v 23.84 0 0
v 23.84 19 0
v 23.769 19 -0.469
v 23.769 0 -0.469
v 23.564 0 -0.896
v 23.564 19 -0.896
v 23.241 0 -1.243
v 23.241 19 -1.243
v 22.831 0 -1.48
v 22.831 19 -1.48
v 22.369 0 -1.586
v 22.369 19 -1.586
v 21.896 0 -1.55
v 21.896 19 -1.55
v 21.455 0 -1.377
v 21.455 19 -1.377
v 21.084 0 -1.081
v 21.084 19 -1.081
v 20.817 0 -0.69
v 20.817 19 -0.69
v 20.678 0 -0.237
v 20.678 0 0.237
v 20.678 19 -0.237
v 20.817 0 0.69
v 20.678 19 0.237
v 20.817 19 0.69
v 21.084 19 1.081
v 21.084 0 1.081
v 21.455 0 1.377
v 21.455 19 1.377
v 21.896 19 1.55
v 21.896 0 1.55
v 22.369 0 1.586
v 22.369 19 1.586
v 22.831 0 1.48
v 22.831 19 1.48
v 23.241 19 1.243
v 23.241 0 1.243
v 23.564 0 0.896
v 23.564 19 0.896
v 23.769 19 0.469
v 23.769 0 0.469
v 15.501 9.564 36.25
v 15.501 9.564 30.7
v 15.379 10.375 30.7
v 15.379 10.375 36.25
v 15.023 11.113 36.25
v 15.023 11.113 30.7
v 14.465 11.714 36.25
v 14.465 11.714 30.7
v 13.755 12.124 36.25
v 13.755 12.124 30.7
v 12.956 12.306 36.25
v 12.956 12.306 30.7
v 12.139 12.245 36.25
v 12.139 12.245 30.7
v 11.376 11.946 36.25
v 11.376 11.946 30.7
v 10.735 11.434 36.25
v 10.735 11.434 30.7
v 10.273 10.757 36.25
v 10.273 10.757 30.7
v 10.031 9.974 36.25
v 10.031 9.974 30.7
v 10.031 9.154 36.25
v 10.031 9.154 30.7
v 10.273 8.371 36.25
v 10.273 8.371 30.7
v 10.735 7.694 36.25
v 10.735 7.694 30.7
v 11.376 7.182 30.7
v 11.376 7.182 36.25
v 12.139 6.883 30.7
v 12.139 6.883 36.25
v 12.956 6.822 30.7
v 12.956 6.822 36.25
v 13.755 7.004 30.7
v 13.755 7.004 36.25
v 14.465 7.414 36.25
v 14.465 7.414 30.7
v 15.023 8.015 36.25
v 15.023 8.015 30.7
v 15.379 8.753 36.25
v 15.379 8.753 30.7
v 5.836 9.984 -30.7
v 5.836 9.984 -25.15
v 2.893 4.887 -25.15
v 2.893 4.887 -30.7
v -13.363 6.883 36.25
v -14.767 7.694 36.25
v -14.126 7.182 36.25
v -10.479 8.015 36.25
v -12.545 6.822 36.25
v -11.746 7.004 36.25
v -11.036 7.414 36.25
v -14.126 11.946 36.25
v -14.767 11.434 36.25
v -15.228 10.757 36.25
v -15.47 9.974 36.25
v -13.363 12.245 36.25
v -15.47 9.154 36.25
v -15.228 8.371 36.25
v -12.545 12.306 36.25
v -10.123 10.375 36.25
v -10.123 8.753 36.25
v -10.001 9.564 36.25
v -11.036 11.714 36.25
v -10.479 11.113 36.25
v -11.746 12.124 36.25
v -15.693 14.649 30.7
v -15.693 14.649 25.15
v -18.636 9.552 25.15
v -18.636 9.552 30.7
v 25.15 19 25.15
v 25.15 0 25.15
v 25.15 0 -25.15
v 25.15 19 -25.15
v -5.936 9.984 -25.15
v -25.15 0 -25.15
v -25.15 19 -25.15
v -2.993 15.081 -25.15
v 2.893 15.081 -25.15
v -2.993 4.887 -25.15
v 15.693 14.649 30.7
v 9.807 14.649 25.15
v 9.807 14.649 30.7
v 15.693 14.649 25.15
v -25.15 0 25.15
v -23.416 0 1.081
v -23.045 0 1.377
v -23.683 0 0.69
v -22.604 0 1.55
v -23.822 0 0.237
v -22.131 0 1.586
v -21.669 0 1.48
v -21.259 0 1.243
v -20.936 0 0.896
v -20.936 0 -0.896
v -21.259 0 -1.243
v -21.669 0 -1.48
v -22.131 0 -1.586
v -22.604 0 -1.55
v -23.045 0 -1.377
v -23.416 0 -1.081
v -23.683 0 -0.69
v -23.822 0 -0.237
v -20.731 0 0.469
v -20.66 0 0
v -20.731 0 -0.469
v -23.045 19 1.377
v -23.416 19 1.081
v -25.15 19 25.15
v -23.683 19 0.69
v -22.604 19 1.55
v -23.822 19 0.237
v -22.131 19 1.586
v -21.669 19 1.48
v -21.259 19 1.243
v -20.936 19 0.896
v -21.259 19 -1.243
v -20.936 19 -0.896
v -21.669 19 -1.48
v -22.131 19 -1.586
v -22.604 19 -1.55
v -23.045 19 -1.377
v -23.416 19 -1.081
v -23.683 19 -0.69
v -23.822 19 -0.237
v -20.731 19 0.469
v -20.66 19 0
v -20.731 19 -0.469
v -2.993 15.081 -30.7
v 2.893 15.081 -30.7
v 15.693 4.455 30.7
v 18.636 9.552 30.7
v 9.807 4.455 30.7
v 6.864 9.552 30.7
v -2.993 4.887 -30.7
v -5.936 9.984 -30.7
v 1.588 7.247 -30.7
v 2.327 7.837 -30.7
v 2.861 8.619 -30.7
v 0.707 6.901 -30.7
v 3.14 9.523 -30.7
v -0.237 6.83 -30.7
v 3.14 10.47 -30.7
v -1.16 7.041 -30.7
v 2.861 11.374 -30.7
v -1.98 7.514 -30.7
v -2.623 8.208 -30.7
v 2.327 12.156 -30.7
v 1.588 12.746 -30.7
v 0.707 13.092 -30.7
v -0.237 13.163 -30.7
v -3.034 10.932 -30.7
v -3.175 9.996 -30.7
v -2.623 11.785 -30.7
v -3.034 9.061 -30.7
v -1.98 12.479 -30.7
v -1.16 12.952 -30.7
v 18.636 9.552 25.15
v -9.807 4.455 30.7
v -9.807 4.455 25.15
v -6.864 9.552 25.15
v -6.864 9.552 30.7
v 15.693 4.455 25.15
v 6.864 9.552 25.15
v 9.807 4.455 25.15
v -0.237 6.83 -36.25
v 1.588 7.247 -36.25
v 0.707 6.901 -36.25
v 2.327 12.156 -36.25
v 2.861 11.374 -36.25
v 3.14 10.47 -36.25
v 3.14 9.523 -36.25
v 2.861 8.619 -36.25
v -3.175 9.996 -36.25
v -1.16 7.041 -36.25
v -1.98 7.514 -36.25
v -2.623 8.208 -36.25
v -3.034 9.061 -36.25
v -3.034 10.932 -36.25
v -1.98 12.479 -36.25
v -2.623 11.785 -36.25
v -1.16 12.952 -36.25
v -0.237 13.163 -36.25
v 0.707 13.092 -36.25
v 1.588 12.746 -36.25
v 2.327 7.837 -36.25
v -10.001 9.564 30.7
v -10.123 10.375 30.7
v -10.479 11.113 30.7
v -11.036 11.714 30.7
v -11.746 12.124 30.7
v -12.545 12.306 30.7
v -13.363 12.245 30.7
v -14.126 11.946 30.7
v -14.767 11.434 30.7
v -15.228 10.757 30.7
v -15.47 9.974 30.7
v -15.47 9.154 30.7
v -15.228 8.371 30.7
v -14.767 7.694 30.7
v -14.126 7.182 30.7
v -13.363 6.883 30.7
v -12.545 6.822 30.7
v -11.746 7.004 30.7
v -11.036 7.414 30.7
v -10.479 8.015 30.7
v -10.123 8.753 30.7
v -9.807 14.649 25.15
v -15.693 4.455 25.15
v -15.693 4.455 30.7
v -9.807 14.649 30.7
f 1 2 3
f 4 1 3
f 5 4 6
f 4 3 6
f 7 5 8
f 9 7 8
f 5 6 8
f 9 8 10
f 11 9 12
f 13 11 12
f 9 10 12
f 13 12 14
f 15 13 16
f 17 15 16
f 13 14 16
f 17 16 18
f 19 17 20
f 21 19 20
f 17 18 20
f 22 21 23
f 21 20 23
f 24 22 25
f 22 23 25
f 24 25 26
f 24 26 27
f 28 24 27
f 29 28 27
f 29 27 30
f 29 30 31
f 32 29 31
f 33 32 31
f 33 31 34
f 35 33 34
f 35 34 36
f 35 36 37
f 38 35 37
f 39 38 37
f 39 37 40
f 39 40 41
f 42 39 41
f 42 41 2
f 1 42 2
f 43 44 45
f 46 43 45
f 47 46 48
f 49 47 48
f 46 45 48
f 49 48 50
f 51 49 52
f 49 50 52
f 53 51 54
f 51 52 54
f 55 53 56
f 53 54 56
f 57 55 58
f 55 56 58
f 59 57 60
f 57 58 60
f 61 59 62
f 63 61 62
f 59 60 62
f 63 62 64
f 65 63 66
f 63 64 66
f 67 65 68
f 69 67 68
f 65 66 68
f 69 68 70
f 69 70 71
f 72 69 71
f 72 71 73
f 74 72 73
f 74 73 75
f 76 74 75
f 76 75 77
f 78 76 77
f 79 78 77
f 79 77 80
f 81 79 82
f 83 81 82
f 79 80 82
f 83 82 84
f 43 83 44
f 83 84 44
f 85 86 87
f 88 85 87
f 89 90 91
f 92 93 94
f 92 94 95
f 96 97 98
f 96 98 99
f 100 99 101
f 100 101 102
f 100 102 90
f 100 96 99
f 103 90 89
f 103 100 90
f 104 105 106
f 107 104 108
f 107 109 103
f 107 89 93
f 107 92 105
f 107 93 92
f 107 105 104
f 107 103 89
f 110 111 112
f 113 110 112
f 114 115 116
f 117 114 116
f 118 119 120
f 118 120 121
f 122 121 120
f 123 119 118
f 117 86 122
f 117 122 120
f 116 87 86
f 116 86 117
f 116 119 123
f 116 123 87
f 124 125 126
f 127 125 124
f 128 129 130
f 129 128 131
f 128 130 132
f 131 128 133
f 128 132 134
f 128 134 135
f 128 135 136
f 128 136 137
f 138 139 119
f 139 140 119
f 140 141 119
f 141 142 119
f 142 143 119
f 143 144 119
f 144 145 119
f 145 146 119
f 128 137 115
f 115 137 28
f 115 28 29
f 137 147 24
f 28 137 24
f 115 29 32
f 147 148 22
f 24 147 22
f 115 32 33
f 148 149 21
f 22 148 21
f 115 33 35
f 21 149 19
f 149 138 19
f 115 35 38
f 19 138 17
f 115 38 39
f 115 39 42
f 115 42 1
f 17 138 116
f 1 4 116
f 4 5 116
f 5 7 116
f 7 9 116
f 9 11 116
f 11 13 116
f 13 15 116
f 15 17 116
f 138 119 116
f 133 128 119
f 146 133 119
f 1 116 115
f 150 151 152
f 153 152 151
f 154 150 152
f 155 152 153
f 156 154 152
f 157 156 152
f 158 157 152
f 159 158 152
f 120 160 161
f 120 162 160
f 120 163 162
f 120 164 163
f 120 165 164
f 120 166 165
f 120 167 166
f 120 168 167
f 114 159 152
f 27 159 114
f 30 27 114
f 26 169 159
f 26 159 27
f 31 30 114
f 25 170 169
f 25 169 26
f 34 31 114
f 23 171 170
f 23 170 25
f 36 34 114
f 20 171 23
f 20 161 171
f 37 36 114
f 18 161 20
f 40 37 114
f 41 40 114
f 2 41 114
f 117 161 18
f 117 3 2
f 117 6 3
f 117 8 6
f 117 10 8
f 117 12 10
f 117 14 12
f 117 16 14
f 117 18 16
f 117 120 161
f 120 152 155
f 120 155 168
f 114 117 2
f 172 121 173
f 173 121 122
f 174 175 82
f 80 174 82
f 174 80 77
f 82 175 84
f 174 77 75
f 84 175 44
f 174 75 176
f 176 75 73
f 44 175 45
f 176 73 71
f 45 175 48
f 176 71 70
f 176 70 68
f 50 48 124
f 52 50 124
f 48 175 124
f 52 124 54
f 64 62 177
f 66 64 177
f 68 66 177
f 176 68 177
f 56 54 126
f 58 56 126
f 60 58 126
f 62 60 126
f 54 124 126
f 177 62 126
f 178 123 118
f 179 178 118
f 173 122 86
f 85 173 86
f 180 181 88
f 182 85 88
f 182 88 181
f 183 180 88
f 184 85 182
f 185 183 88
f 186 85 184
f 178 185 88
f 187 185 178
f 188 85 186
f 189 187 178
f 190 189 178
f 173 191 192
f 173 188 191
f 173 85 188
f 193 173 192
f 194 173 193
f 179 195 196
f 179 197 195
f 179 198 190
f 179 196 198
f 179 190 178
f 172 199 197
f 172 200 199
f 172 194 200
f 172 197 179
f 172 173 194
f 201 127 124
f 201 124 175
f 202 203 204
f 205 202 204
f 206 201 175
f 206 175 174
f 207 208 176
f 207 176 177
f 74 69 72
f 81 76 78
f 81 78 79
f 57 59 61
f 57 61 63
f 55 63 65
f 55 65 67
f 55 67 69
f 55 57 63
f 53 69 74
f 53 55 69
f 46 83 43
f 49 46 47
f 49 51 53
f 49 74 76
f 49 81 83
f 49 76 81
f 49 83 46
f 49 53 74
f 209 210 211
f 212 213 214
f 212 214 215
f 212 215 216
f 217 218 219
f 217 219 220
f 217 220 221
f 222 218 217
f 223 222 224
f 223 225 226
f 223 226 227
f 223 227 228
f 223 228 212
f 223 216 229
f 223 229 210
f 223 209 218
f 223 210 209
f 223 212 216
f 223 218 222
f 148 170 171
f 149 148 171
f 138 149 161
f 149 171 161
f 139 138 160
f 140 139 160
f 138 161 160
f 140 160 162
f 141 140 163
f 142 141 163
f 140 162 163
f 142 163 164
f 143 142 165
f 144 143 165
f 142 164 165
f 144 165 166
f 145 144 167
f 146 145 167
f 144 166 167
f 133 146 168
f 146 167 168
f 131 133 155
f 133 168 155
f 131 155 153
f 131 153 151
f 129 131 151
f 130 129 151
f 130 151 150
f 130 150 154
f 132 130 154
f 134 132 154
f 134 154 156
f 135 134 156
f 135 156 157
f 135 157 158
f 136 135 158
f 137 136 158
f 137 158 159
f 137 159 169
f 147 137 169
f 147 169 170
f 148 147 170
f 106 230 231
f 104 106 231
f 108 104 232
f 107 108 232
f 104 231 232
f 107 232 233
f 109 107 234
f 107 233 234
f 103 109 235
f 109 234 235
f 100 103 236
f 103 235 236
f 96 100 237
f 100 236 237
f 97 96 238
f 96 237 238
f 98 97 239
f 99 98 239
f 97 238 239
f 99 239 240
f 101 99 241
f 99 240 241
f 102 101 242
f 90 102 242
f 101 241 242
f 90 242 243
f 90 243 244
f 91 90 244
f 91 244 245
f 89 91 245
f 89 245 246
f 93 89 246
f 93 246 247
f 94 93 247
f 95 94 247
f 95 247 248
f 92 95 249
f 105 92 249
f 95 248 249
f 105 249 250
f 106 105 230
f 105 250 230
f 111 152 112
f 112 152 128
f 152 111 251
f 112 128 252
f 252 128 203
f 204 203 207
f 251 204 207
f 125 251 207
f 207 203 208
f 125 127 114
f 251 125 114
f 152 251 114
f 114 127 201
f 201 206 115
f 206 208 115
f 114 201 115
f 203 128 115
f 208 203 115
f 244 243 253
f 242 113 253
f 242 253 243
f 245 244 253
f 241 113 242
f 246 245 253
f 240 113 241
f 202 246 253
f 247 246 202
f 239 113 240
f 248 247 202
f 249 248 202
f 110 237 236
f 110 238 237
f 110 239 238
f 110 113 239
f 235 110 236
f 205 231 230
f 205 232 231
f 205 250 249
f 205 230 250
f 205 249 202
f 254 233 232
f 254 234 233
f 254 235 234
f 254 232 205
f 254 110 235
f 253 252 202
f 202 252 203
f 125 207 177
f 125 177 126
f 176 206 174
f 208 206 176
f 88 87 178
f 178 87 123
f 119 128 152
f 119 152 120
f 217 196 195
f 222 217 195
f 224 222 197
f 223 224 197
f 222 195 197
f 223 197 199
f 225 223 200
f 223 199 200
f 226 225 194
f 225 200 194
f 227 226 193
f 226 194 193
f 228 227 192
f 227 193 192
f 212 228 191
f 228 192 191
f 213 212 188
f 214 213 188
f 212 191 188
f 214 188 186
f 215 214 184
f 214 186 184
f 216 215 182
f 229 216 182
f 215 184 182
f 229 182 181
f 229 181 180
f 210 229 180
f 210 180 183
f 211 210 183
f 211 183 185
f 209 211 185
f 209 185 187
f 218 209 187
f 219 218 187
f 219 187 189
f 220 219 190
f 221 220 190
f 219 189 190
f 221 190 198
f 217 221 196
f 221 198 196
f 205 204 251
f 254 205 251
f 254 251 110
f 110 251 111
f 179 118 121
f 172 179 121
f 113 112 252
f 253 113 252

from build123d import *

# Parameters (mm, degrees)
SKETCH1_W           = 50.3
SKETCH1_H           = 50.3
BOSS_EXTRUDE1_DEPTH = 19
BOSS_EXTRUDE2_DEPTH = 5.55
BOSS_EXTRUDE3_DEPTH = 5.55
SKETCH5_R           = 3.175
BOSS_EXTRUDE4_DEPTH = 5.55
SKETCH7_R           = 2.75
BOSS_EXTRUDE5_DEPTH = 5.55
SKETCH8_R           = 1.59
CUT_EXTRUDE1_DEPTH  = 20


with BuildPart() as part:
    # Sketch1 → Boss-Extrude1 (new body)
    with BuildSketch(Plane(origin=(0, 0, 0), x_dir=(1, 0, 0), z_dir=(0, 1, 0))):
        Rectangle(SKETCH1_W, SKETCH1_H)
    extrude(amount=BOSS_EXTRUDE1_DEPTH)

    # Sketch2 → Boss-Extrude2 (add)
    with BuildSketch(Plane.XY.offset(25.15)):
        Polygon((-15.692878403, 14.649004006), (-18.635756806, 9.551789092), (-15.692878403, 4.454574178), (-9.807121597, 4.454574178), (-6.864243194, 9.551789092), (-9.807121597, 14.649004006), align=None)
        Polygon((18.635756806, 9.551789092), (15.692878403, 4.454574178), (9.807121597, 4.454574178), (6.864243194, 9.551789092), (9.807121597, 14.649004006), (15.692878403, 14.649004006), align=None)
    extrude(amount=BOSS_EXTRUDE2_DEPTH)

    # Sketch4 → Boss-Extrude3 (add)
    with BuildSketch(Plane(origin=(0, 0, -25.15), x_dir=(-1, 0, 0), z_dir=(0, 0, -1))):
        Polygon((-5.835508644, 9.984378867), (-2.892754322, 4.887378867), (2.992754322, 4.887378867), (5.935508644, 9.984378867), (2.992754322, 15.081378867), (-2.892754322, 15.081378867), align=None)
    extrude(amount=BOSS_EXTRUDE3_DEPTH)

    # Sketch5 → Boss-Extrude4 (add)
    with BuildSketch(Plane(origin=(0, 0, -30.7), x_dir=(-1, 0, 0), z_dir=(0, 0, -1))):
        with Locations((0, 9.996378867)):
            Circle(SKETCH5_R)
    extrude(amount=BOSS_EXTRUDE4_DEPTH)

    # Sketch7 → Boss-Extrude5 (add)
    with BuildSketch(Plane.XY.offset(30.7)):
        with Locations((-12.750756806, 9.564004006)):
            Circle(SKETCH7_R)
        with Locations((12.750756806, 9.564004006)):
            Circle(SKETCH7_R)
    extrude(amount=BOSS_EXTRUDE5_DEPTH)

    # Sketch8 → Cut-Extrude1 (cut, through all)
    with BuildSketch(Plane(origin=(0, 19, 0), x_dir=(1, 0, 0), z_dir=(0, 1, 0))):
        with Locations((-22.25, 0)):
            Circle(SKETCH8_R)
        with Locations((22.25, 0)):
            Circle(SKETCH8_R)
    extrude(amount=-CUT_EXTRUDE1_DEPTH, mode=Mode.SUBTRACT)


solid = part.part
